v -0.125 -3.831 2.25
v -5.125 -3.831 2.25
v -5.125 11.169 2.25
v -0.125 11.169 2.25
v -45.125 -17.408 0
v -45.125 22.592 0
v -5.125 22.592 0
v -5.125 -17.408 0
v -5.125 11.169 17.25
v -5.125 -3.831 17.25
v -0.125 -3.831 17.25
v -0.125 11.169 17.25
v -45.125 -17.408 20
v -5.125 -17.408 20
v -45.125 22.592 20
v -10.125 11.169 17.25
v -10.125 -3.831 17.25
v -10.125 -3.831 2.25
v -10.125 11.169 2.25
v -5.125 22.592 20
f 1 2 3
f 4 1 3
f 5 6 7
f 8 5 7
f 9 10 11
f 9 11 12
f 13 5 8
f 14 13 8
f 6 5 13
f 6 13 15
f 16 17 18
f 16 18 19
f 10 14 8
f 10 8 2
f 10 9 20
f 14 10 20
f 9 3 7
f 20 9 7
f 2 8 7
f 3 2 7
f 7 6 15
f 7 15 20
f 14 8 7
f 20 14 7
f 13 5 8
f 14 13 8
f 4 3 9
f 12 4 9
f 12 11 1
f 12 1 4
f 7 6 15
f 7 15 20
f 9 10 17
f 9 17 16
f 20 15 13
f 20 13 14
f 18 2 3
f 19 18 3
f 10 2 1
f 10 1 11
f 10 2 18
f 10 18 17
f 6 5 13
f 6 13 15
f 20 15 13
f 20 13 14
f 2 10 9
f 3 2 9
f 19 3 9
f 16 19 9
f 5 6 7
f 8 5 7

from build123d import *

# Parameters (mm, degrees)
F0_W     = 40
F0_H     = 40
F1_DEPTH = 20
F2_W     = 15
F2_H     = 15
F4_DEPTH = 5
F7_DEPTH = 5


with BuildPart() as f1:
    # F0 (on Top) → F1 (new body)
    with BuildSketch(Plane.XY):
        with Locations((-25.1250002766, 2.5922219666)):
            Rectangle(F0_W, F0_H)
    extrude(amount=F1_DEPTH)


with BuildPart() as f3_1:
    # F3: copy of F1
    add(f1.part)


with BuildPart() as f4:
    # F2 (on face) → F4 (new body)
    with BuildSketch(Plane.YZ.offset(-5.1250002766)):
        with Locations((3.6685534939, 9.7496453021)):
            Rectangle(F2_W, F2_H)
    extrude(amount=F4_DEPTH)


with BuildPart() as f6_1:
    # F6: copy of F1
    add(f1.part)

    # F2 (on face) → F7 (cut)
    with BuildSketch(Plane.YZ.offset(-5.1250002766)):
        with Locations((3.6685534939, 9.7496453021)):
            Rectangle(F2_W, F2_H)
    extrude(amount=-F7_DEPTH, mode=Mode.SUBTRACT)


solid = Compound([f1.part, f4.part, f6_1.part])
